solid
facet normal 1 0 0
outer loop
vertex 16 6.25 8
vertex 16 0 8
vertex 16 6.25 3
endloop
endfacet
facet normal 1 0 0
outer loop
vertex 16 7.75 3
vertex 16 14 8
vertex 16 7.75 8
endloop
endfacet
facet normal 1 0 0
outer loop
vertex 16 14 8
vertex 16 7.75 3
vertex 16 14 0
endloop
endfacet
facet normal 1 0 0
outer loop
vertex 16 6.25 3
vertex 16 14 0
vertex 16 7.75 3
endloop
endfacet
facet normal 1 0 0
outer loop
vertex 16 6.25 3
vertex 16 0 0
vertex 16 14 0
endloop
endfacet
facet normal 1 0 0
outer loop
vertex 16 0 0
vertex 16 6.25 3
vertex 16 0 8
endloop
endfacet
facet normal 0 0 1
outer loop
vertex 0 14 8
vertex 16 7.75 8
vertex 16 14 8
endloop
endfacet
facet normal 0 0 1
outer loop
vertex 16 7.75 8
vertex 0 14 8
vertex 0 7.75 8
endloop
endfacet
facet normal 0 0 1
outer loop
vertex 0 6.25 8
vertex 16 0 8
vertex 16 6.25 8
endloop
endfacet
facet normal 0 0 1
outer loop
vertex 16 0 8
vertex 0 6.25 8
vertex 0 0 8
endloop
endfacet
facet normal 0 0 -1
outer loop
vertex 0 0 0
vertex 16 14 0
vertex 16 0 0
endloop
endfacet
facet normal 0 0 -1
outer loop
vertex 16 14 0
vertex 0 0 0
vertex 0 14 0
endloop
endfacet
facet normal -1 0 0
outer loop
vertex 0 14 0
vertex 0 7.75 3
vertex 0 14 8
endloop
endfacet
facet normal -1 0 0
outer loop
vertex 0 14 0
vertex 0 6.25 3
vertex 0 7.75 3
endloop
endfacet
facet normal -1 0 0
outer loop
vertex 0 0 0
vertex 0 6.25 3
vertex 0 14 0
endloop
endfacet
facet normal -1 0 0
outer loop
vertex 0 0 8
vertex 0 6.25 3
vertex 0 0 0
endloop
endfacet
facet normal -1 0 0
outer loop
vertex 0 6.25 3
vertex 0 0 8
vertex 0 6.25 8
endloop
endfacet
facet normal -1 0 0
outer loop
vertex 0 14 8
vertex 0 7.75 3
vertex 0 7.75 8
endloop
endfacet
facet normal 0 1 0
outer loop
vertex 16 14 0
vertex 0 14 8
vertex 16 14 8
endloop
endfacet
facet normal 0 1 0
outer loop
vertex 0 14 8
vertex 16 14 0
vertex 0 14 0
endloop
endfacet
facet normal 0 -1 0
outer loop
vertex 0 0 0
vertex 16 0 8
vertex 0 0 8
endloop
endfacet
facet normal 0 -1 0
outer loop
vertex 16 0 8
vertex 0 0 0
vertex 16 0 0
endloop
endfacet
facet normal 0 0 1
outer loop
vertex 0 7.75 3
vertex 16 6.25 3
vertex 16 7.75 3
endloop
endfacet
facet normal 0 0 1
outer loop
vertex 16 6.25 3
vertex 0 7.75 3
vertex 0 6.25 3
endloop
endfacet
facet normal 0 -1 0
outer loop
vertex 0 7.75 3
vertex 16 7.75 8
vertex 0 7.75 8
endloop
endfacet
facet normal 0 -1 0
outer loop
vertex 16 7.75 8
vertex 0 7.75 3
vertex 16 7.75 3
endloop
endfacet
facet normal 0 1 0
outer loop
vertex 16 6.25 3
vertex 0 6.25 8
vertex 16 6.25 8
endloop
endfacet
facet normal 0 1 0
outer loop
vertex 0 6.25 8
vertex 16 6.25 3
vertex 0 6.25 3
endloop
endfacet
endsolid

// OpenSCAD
$fn = 32;

// ----------------------------------------------------------------------
// Micro clip: slotted block, 5-20 mm class
// ----------------------------------------------------------------------

// --- parameters (mm) ---
block_l = 16;             // block length, X
block_w = 14;             // block width, Y
block_h = 8;              // block height, Z
slot_w = 1.5;             // slot width
slot_d = 5;               // slot depth from the top
fit_tol = 0.05;           // tolerance for press fits, mm
free_tol = 0.3;           // tolerance for clearance fits, mm

difference() {
  cube([block_l, block_w, block_h]);
  translate([-1, block_w / 2 - slot_w / 2, block_h - slot_d])
    cube([block_l + 2, slot_w, slot_d + 1]);
}
